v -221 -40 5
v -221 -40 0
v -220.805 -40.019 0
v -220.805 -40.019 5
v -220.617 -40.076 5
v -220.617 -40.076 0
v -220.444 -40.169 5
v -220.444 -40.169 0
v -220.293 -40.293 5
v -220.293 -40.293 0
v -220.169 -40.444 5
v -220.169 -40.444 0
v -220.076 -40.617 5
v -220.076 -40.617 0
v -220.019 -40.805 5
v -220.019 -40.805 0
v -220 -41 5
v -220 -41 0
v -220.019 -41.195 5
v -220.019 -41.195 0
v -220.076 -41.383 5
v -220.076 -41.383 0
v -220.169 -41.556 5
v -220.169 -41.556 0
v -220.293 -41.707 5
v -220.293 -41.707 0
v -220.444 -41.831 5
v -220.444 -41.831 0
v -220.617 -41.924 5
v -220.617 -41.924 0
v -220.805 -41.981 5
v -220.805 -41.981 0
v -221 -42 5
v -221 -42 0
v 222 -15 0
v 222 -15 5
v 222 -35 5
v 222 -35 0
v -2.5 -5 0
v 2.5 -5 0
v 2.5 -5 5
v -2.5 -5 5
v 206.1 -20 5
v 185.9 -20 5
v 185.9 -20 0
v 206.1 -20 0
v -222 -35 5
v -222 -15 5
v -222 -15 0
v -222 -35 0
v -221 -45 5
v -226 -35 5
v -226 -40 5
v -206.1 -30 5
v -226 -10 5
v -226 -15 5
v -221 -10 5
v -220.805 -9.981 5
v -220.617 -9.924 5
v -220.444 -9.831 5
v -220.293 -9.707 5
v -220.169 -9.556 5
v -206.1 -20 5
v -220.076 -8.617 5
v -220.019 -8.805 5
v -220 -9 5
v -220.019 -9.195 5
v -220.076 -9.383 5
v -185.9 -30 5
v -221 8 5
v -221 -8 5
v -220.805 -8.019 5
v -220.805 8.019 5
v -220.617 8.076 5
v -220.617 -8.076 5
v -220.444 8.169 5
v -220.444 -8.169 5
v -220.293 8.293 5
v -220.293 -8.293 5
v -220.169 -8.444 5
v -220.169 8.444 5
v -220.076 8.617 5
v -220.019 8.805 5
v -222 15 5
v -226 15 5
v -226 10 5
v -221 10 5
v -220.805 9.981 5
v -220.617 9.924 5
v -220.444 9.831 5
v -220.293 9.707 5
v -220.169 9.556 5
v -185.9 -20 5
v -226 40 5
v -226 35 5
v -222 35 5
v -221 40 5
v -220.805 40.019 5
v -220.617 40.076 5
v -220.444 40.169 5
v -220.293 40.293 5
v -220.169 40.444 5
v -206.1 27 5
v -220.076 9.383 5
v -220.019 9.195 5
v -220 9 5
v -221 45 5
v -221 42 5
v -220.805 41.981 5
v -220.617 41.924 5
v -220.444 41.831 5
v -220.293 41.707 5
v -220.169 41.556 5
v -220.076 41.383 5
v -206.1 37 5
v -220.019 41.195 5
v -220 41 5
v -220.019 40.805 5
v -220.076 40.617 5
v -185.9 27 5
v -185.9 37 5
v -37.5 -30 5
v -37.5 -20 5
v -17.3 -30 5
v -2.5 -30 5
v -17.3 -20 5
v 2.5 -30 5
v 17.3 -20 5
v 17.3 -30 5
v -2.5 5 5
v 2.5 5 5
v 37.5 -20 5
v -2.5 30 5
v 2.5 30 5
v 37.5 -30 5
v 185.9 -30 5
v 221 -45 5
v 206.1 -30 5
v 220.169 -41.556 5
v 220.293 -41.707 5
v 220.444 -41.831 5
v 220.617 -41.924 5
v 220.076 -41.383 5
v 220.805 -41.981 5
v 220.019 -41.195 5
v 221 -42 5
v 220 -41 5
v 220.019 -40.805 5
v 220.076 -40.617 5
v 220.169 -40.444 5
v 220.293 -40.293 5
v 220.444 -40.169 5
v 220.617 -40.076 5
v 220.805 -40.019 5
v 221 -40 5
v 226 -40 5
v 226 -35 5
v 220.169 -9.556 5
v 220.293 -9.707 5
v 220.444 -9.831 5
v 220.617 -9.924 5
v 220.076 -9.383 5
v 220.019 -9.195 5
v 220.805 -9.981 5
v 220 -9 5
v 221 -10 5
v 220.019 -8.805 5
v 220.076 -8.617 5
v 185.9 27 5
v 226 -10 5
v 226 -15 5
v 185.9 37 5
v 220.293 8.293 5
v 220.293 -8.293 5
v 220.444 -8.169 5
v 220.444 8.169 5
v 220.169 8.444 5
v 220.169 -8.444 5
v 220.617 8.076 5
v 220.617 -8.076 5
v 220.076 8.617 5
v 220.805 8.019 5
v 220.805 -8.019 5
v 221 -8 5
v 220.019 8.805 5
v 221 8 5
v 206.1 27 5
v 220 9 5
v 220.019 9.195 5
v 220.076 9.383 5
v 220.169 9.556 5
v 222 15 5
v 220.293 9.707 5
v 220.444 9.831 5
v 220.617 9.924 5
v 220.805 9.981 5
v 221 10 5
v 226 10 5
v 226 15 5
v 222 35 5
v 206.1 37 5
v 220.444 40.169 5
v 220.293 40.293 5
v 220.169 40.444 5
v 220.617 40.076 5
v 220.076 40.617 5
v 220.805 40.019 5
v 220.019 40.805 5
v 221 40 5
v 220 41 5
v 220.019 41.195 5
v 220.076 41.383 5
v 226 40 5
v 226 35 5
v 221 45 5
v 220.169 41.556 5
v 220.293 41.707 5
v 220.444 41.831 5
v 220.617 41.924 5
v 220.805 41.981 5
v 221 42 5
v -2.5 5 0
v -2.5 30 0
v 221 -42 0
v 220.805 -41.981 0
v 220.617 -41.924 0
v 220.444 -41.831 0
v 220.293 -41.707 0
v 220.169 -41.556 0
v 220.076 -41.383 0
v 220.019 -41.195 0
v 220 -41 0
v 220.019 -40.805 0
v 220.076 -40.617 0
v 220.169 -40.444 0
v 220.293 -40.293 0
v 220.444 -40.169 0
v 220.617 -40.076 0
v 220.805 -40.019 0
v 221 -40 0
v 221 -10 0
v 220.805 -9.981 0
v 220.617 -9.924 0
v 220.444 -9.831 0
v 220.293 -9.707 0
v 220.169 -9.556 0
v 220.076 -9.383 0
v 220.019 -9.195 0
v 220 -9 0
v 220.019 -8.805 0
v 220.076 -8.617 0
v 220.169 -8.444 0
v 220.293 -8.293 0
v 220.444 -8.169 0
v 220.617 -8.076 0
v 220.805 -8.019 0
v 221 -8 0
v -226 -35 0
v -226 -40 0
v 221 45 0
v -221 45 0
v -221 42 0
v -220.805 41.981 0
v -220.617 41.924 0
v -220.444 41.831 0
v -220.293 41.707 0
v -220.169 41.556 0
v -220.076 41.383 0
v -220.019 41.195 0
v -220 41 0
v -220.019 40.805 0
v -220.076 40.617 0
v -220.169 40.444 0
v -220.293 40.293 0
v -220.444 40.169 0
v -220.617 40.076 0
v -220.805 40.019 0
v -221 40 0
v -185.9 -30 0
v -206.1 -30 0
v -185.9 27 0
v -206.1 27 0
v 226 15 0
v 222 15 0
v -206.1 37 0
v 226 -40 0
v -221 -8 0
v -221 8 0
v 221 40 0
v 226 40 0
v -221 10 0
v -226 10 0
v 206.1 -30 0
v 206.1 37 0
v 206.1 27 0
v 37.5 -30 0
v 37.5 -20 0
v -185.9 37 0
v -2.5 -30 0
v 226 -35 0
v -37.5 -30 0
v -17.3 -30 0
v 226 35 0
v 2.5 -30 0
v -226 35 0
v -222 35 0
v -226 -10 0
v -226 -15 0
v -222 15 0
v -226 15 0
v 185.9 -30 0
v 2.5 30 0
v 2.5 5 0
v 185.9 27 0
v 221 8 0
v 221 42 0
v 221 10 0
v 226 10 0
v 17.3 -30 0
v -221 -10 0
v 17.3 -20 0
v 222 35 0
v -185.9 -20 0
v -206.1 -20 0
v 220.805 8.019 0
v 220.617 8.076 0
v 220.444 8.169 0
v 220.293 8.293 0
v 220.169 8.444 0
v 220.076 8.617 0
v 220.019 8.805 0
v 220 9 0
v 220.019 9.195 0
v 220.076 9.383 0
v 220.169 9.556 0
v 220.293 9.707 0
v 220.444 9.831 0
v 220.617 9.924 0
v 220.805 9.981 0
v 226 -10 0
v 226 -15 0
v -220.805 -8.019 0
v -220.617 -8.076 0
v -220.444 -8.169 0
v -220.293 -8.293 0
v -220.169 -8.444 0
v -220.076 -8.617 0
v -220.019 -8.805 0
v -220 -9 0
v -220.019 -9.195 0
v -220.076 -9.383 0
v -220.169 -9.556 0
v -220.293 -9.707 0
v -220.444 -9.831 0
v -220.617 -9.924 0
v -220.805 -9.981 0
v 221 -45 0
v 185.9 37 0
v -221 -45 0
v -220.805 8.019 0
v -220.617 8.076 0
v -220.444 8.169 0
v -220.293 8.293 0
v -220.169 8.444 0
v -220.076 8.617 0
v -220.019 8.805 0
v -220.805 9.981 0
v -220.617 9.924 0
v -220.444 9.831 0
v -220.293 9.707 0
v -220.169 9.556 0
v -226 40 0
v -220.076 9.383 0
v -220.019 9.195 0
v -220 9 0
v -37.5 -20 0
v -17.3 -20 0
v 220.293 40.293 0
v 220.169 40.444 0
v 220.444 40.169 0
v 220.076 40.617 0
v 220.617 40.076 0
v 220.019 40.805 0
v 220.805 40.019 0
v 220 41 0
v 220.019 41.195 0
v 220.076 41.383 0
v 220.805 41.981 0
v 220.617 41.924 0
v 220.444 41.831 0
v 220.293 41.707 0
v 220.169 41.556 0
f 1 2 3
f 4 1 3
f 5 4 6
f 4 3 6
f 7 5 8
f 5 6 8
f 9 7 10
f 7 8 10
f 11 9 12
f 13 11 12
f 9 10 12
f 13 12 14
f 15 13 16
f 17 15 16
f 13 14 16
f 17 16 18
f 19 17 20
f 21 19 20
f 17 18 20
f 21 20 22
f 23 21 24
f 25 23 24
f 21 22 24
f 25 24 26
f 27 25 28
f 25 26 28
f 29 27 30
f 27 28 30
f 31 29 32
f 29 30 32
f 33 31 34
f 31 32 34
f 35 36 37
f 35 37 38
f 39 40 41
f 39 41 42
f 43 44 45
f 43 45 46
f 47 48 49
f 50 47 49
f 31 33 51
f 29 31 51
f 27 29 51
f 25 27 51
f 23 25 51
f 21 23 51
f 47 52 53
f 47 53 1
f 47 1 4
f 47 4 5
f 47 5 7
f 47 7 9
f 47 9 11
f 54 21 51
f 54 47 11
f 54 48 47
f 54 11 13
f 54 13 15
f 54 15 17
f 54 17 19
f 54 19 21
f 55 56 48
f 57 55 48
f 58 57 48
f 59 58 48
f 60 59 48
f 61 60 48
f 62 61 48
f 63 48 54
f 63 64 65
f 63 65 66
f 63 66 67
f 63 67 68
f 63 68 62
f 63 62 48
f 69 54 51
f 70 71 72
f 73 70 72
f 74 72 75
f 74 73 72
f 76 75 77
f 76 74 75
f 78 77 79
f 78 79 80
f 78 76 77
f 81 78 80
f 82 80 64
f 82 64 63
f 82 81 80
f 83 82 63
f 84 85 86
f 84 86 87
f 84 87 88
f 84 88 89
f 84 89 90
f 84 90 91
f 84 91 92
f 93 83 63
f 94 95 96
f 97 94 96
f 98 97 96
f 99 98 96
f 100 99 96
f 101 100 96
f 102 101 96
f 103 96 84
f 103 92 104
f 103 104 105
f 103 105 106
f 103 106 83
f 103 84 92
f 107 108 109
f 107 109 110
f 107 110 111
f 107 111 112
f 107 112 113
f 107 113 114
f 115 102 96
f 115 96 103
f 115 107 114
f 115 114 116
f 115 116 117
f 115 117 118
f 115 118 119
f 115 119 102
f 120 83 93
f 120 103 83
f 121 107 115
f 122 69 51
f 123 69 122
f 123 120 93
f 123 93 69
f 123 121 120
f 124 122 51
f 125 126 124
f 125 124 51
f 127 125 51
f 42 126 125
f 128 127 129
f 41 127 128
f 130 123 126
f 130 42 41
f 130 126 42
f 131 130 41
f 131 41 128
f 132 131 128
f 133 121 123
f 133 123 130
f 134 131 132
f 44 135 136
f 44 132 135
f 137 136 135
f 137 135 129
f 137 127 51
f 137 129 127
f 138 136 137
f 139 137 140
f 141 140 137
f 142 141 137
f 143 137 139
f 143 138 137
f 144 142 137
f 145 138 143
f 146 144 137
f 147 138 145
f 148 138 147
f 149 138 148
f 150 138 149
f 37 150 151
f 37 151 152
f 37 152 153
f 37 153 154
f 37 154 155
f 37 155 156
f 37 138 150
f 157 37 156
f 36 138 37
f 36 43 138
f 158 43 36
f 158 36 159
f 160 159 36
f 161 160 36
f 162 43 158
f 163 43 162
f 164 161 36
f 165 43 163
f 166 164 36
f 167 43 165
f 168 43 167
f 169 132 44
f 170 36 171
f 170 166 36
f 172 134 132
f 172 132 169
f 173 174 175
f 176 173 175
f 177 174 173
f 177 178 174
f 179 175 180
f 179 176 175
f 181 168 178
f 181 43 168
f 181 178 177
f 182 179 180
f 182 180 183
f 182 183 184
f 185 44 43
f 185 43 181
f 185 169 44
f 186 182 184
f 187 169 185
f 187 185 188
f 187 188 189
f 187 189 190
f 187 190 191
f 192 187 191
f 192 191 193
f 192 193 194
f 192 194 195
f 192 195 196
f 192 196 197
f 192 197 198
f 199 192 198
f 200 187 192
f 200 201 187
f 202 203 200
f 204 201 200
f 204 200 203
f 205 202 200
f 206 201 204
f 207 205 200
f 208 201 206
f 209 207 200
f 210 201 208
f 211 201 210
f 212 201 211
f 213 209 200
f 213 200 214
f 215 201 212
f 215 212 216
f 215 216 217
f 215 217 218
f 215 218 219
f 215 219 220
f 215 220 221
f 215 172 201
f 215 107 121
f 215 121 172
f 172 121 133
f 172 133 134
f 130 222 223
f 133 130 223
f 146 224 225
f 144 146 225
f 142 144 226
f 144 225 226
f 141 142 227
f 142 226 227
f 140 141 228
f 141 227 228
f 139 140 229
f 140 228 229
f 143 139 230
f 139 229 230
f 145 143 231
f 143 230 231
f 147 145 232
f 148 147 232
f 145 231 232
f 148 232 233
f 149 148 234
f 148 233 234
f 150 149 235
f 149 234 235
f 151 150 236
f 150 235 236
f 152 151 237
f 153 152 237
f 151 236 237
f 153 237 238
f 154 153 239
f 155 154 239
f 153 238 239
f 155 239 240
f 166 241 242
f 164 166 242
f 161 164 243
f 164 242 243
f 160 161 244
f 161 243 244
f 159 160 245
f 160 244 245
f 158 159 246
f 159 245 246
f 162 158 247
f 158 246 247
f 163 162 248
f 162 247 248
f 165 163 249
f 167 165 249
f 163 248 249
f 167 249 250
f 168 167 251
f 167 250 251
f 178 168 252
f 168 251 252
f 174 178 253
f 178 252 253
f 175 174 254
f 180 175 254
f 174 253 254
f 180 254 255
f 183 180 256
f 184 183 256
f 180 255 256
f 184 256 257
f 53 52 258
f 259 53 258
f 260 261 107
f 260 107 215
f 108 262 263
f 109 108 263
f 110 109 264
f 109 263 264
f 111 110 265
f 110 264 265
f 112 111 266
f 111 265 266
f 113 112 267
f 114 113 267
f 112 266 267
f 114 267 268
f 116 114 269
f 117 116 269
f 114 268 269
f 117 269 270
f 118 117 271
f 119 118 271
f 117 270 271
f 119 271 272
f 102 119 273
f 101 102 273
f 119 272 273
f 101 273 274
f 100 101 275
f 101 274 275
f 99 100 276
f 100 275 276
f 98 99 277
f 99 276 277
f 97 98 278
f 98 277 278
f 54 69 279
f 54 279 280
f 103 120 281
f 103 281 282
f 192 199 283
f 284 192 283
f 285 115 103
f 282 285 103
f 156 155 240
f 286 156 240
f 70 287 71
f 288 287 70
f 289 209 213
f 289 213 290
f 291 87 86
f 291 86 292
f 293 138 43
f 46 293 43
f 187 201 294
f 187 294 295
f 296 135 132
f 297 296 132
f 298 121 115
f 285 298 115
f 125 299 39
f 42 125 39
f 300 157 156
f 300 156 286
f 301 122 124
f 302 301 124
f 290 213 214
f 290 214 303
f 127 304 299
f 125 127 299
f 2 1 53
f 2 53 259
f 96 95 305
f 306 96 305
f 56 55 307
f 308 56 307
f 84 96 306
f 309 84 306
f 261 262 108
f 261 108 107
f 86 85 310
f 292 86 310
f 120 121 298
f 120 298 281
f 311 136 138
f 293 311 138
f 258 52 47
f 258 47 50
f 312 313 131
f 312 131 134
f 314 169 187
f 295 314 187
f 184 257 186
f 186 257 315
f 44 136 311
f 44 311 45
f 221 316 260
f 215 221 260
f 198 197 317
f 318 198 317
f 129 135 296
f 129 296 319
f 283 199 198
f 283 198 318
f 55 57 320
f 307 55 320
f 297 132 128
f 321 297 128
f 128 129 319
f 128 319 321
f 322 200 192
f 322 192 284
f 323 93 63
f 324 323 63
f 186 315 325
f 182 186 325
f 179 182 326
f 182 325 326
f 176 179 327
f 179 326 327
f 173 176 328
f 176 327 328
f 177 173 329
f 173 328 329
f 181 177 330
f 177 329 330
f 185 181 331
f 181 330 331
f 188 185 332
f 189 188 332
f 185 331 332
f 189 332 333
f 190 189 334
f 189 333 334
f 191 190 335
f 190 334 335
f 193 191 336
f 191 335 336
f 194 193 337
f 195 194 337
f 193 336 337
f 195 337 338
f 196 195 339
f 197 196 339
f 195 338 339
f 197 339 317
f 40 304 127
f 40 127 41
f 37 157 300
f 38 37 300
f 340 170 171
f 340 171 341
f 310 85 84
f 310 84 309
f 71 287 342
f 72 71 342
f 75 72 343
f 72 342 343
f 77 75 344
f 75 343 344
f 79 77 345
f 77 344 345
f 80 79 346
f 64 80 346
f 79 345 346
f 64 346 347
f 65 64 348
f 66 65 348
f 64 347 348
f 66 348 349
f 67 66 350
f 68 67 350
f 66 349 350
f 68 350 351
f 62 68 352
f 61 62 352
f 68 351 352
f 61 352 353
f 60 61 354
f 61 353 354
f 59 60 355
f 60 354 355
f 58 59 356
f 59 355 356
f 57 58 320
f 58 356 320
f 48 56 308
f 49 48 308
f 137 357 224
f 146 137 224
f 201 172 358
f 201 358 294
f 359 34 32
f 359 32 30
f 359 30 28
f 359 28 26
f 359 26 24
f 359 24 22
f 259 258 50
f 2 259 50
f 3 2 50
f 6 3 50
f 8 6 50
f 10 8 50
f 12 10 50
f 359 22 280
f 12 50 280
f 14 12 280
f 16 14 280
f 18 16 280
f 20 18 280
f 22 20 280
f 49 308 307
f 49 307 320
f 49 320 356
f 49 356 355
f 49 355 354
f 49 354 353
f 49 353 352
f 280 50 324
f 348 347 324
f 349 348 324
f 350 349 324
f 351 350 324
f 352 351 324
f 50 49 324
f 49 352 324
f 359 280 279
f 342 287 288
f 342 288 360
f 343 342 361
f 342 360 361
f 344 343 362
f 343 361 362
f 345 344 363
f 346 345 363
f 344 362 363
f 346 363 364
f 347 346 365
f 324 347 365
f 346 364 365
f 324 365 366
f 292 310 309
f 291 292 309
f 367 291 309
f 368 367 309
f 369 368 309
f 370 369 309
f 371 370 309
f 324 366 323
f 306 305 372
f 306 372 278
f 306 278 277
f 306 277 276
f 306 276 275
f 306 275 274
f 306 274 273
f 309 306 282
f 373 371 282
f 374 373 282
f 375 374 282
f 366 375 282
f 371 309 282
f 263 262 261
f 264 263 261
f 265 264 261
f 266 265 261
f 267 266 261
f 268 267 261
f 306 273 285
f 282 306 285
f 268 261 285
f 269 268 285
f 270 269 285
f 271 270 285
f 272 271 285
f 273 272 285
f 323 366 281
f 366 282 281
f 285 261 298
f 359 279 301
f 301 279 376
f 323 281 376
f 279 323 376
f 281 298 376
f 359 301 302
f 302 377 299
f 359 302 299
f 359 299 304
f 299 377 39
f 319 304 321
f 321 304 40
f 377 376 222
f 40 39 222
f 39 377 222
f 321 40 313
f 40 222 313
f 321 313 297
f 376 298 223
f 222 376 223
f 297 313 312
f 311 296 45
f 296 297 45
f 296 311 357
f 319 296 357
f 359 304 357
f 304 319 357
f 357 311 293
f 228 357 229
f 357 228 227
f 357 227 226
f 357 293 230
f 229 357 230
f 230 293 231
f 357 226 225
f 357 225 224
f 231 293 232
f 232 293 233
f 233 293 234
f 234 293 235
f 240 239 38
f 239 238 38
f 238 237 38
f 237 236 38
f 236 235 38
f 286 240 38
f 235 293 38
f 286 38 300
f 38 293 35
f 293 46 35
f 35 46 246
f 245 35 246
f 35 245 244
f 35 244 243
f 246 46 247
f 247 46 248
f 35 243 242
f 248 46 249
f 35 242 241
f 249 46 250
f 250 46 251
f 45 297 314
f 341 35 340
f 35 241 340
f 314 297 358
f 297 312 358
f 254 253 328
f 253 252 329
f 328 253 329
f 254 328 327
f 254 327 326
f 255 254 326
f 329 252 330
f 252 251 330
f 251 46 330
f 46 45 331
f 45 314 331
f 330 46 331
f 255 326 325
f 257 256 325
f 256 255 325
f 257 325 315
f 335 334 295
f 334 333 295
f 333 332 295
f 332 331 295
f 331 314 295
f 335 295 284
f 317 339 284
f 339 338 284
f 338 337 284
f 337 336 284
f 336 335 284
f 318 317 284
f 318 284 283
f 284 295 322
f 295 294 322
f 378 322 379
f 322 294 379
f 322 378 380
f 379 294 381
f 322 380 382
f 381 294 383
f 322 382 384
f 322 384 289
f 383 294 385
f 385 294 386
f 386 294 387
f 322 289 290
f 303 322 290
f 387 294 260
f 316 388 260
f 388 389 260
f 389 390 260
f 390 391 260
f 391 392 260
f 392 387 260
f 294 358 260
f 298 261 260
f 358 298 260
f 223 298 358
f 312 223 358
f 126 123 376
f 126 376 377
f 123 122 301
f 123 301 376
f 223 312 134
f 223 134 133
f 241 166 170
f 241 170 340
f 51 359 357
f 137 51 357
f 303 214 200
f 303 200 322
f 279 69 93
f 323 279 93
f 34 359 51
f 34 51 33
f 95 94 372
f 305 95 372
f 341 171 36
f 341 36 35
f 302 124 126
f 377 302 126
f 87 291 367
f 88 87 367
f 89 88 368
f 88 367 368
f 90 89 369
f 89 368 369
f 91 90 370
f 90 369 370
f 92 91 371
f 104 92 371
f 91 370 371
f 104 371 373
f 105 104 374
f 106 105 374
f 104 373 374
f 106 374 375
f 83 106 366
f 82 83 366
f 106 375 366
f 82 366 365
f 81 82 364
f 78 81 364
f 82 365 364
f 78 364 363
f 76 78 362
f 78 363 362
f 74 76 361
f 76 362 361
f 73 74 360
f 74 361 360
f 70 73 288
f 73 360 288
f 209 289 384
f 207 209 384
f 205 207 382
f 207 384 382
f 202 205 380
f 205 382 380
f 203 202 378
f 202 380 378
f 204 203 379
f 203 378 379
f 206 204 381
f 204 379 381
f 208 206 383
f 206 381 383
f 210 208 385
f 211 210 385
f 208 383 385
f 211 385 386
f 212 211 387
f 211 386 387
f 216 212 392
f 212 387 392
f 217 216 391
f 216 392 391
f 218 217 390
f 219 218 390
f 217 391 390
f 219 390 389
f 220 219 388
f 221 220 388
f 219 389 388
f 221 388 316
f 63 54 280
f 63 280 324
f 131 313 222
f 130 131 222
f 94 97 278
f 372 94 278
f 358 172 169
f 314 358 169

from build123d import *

# Parameters (mm, degrees)
SKETCH1_W               = 442
SKETCH1_H               = 90
BOSS_EXTRUDE1_DEPTH     = 5
SKETCH3_W               = 5
SKETCH3_H               = 25
CUT_EXTRUDE2_DEPTH      = 226.590336672
SKETCH5_W               = 5
SKETCH5_H               = 30
BOSS_EXTRUDE2_DEPTH     = 5
SKETCH6_W               = 5
SKETCH6_H               = 20
CUT_EXTRUDE4_DEPTH      = 4
SKETCH7_R               = 1
CUT_EXTRUDE5_DEPTH      = 231.490780727
SKETCH8_W               = 20.2
SKETCH8_H               = 10
CUT_EXTRUDE6_DEPTH      = 10
SKETCH9_W               = 20.2
SKETCH9_H               = 10
CUT_EXTRUDE7_DEPTH      = 300
MIRROR4_COPY_1_SKETCH_W = 20.2
MIRROR4_COPY_1_SKETCH_H = 10
MIRROR4_COPY_1_DEPTH    = 10


with BuildPart() as part:
    # Sketch1 → Boss-Extrude1 (new body)
    with BuildSketch(Plane.XY):
        Rectangle(SKETCH1_W, SKETCH1_H)
    extrude(amount=BOSS_EXTRUDE1_DEPTH)

    # Sketch3 → Cut-Extrude2 (cut, through all)
    with BuildSketch(Plane(origin=(0, 0, 0), x_dir=(-1, 0, 0), z_dir=(0, 0, -1))):
        with Locations((0, 17.5)):
            Rectangle(SKETCH3_W, SKETCH3_H)
        with Locations((0, -17.5)):
            Rectangle(SKETCH3_W, SKETCH3_H)
    extrude(amount=-CUT_EXTRUDE2_DEPTH, mode=Mode.SUBTRACT)

    # Sketch5 → Boss-Extrude2 (add)
    with BuildSketch(Plane(origin=(221, 0, 0), x_dir=(0, 0, -1), z_dir=(1, 0, 0))):
        with Locations((-2.5, 25)):
            Rectangle(SKETCH5_W, SKETCH5_H)
        with Locations((-2.5, -25)):
            Rectangle(SKETCH5_W, SKETCH5_H)
    boss_extrude2 = extrude(amount=BOSS_EXTRUDE2_DEPTH)

    # Sketch6 → Cut-Extrude4 (cut)
    with BuildSketch(Plane(origin=(226, 0, 0), x_dir=(0, 0, -1), z_dir=(1, 0, 0))):
        with Locations((-2.5, 25)):
            Rectangle(SKETCH6_W, SKETCH6_H)
        with Locations((-2.5, -25)):
            Rectangle(SKETCH6_W, SKETCH6_H)
    cut_extrude4 = extrude(amount=-CUT_EXTRUDE4_DEPTH, mode=Mode.SUBTRACT)

    # Mirror1: Boss-Extrude2, Cut-Extrude4 across plane
    add(boss_extrude2.mirror(Plane(origin=(0, 0, 0), x_dir=(0, 0, 1), z_dir=(1, 0, 0))))
    add(cut_extrude4.mirror(Plane(origin=(0, 0, 0), x_dir=(0, 0, 1), z_dir=(1, 0, 0))), mode=Mode.SUBTRACT)

    # Sketch7 → Cut-Extrude5 (cut, through all)
    with BuildSketch(Plane(origin=(0, 0, 0), x_dir=(-1, 0, 0), z_dir=(0, 0, -1))):
        with Locations((-221, 9)):
            Circle(SKETCH7_R)
        with Locations((-221, -9)):
            Circle(SKETCH7_R)
        with Locations((-221, -41)):
            Circle(SKETCH7_R)
        with Locations((221, -41)):
            Circle(SKETCH7_R)
        with Locations((221, -9)):
            Circle(SKETCH7_R)
        with Locations((221, 9)):
            Circle(SKETCH7_R)
        with Locations((-221, 41)):
            Circle(SKETCH7_R)
        with Locations((221, 41)):
            Circle(SKETCH7_R)
    extrude(amount=-CUT_EXTRUDE5_DEPTH, mode=Mode.SUBTRACT)

    # Sketch8 → Cut-Extrude6 (cut)
    with BuildSketch(Plane(origin=(102.718818309, -610.456150304, 5), x_dir=(1, 0, 0), z_dir=(0, 0, 1))):
        with Locations((93.281181691, 585.456150304)):
            Rectangle(SKETCH8_W, SKETCH8_H)
    cut_extrude6 = extrude(amount=-CUT_EXTRUDE6_DEPTH, mode=Mode.SUBTRACT)

    # Mirror2: Cut-Extrude6 across plane
    add(cut_extrude6.mirror(Plane(origin=(0, 0, 0), x_dir=(0, 0, 1), z_dir=(1, 0, 0))), mode=Mode.SUBTRACT)

    # Sketch9 → Cut-Extrude7 (cut)
    with BuildSketch(Plane(origin=(102.718818309, -610.456150304, 228.5), x_dir=(1, 0, 0), z_dir=(0, 0, 1))):
        with Locations((-130.118818309, 585.456150304)):
            Rectangle(SKETCH9_W, SKETCH9_H)
    cut_extrude7 = extrude(amount=-CUT_EXTRUDE7_DEPTH, mode=Mode.SUBTRACT)

    # Mirror3: Cut-Extrude7 across plane
    add(cut_extrude7.mirror(Plane(origin=(0, 0, 0), x_dir=(0, 0, 1), z_dir=(1, 0, 0))), mode=Mode.SUBTRACT)

    # Mirror4: Cut-Extrude6 across plane
    add(cut_extrude6.mirror(Plane.ZX.offset(3.5)), mode=Mode.SUBTRACT)

    # Mirror4 copy 1 sketch → Mirror4 copy 1 (cut)
    with BuildSketch(Plane(origin=(-102.718818309, 617.456150304, 5), x_dir=(-1, 0, 0), z_dir=(0, 0, 1))):
        with Locations((93.281181691, 585.456150304)):
            Rectangle(MIRROR4_COPY_1_SKETCH_W, MIRROR4_COPY_1_SKETCH_H)
    extrude(amount=-MIRROR4_COPY_1_DEPTH, mode=Mode.SUBTRACT)


solid = part.part
